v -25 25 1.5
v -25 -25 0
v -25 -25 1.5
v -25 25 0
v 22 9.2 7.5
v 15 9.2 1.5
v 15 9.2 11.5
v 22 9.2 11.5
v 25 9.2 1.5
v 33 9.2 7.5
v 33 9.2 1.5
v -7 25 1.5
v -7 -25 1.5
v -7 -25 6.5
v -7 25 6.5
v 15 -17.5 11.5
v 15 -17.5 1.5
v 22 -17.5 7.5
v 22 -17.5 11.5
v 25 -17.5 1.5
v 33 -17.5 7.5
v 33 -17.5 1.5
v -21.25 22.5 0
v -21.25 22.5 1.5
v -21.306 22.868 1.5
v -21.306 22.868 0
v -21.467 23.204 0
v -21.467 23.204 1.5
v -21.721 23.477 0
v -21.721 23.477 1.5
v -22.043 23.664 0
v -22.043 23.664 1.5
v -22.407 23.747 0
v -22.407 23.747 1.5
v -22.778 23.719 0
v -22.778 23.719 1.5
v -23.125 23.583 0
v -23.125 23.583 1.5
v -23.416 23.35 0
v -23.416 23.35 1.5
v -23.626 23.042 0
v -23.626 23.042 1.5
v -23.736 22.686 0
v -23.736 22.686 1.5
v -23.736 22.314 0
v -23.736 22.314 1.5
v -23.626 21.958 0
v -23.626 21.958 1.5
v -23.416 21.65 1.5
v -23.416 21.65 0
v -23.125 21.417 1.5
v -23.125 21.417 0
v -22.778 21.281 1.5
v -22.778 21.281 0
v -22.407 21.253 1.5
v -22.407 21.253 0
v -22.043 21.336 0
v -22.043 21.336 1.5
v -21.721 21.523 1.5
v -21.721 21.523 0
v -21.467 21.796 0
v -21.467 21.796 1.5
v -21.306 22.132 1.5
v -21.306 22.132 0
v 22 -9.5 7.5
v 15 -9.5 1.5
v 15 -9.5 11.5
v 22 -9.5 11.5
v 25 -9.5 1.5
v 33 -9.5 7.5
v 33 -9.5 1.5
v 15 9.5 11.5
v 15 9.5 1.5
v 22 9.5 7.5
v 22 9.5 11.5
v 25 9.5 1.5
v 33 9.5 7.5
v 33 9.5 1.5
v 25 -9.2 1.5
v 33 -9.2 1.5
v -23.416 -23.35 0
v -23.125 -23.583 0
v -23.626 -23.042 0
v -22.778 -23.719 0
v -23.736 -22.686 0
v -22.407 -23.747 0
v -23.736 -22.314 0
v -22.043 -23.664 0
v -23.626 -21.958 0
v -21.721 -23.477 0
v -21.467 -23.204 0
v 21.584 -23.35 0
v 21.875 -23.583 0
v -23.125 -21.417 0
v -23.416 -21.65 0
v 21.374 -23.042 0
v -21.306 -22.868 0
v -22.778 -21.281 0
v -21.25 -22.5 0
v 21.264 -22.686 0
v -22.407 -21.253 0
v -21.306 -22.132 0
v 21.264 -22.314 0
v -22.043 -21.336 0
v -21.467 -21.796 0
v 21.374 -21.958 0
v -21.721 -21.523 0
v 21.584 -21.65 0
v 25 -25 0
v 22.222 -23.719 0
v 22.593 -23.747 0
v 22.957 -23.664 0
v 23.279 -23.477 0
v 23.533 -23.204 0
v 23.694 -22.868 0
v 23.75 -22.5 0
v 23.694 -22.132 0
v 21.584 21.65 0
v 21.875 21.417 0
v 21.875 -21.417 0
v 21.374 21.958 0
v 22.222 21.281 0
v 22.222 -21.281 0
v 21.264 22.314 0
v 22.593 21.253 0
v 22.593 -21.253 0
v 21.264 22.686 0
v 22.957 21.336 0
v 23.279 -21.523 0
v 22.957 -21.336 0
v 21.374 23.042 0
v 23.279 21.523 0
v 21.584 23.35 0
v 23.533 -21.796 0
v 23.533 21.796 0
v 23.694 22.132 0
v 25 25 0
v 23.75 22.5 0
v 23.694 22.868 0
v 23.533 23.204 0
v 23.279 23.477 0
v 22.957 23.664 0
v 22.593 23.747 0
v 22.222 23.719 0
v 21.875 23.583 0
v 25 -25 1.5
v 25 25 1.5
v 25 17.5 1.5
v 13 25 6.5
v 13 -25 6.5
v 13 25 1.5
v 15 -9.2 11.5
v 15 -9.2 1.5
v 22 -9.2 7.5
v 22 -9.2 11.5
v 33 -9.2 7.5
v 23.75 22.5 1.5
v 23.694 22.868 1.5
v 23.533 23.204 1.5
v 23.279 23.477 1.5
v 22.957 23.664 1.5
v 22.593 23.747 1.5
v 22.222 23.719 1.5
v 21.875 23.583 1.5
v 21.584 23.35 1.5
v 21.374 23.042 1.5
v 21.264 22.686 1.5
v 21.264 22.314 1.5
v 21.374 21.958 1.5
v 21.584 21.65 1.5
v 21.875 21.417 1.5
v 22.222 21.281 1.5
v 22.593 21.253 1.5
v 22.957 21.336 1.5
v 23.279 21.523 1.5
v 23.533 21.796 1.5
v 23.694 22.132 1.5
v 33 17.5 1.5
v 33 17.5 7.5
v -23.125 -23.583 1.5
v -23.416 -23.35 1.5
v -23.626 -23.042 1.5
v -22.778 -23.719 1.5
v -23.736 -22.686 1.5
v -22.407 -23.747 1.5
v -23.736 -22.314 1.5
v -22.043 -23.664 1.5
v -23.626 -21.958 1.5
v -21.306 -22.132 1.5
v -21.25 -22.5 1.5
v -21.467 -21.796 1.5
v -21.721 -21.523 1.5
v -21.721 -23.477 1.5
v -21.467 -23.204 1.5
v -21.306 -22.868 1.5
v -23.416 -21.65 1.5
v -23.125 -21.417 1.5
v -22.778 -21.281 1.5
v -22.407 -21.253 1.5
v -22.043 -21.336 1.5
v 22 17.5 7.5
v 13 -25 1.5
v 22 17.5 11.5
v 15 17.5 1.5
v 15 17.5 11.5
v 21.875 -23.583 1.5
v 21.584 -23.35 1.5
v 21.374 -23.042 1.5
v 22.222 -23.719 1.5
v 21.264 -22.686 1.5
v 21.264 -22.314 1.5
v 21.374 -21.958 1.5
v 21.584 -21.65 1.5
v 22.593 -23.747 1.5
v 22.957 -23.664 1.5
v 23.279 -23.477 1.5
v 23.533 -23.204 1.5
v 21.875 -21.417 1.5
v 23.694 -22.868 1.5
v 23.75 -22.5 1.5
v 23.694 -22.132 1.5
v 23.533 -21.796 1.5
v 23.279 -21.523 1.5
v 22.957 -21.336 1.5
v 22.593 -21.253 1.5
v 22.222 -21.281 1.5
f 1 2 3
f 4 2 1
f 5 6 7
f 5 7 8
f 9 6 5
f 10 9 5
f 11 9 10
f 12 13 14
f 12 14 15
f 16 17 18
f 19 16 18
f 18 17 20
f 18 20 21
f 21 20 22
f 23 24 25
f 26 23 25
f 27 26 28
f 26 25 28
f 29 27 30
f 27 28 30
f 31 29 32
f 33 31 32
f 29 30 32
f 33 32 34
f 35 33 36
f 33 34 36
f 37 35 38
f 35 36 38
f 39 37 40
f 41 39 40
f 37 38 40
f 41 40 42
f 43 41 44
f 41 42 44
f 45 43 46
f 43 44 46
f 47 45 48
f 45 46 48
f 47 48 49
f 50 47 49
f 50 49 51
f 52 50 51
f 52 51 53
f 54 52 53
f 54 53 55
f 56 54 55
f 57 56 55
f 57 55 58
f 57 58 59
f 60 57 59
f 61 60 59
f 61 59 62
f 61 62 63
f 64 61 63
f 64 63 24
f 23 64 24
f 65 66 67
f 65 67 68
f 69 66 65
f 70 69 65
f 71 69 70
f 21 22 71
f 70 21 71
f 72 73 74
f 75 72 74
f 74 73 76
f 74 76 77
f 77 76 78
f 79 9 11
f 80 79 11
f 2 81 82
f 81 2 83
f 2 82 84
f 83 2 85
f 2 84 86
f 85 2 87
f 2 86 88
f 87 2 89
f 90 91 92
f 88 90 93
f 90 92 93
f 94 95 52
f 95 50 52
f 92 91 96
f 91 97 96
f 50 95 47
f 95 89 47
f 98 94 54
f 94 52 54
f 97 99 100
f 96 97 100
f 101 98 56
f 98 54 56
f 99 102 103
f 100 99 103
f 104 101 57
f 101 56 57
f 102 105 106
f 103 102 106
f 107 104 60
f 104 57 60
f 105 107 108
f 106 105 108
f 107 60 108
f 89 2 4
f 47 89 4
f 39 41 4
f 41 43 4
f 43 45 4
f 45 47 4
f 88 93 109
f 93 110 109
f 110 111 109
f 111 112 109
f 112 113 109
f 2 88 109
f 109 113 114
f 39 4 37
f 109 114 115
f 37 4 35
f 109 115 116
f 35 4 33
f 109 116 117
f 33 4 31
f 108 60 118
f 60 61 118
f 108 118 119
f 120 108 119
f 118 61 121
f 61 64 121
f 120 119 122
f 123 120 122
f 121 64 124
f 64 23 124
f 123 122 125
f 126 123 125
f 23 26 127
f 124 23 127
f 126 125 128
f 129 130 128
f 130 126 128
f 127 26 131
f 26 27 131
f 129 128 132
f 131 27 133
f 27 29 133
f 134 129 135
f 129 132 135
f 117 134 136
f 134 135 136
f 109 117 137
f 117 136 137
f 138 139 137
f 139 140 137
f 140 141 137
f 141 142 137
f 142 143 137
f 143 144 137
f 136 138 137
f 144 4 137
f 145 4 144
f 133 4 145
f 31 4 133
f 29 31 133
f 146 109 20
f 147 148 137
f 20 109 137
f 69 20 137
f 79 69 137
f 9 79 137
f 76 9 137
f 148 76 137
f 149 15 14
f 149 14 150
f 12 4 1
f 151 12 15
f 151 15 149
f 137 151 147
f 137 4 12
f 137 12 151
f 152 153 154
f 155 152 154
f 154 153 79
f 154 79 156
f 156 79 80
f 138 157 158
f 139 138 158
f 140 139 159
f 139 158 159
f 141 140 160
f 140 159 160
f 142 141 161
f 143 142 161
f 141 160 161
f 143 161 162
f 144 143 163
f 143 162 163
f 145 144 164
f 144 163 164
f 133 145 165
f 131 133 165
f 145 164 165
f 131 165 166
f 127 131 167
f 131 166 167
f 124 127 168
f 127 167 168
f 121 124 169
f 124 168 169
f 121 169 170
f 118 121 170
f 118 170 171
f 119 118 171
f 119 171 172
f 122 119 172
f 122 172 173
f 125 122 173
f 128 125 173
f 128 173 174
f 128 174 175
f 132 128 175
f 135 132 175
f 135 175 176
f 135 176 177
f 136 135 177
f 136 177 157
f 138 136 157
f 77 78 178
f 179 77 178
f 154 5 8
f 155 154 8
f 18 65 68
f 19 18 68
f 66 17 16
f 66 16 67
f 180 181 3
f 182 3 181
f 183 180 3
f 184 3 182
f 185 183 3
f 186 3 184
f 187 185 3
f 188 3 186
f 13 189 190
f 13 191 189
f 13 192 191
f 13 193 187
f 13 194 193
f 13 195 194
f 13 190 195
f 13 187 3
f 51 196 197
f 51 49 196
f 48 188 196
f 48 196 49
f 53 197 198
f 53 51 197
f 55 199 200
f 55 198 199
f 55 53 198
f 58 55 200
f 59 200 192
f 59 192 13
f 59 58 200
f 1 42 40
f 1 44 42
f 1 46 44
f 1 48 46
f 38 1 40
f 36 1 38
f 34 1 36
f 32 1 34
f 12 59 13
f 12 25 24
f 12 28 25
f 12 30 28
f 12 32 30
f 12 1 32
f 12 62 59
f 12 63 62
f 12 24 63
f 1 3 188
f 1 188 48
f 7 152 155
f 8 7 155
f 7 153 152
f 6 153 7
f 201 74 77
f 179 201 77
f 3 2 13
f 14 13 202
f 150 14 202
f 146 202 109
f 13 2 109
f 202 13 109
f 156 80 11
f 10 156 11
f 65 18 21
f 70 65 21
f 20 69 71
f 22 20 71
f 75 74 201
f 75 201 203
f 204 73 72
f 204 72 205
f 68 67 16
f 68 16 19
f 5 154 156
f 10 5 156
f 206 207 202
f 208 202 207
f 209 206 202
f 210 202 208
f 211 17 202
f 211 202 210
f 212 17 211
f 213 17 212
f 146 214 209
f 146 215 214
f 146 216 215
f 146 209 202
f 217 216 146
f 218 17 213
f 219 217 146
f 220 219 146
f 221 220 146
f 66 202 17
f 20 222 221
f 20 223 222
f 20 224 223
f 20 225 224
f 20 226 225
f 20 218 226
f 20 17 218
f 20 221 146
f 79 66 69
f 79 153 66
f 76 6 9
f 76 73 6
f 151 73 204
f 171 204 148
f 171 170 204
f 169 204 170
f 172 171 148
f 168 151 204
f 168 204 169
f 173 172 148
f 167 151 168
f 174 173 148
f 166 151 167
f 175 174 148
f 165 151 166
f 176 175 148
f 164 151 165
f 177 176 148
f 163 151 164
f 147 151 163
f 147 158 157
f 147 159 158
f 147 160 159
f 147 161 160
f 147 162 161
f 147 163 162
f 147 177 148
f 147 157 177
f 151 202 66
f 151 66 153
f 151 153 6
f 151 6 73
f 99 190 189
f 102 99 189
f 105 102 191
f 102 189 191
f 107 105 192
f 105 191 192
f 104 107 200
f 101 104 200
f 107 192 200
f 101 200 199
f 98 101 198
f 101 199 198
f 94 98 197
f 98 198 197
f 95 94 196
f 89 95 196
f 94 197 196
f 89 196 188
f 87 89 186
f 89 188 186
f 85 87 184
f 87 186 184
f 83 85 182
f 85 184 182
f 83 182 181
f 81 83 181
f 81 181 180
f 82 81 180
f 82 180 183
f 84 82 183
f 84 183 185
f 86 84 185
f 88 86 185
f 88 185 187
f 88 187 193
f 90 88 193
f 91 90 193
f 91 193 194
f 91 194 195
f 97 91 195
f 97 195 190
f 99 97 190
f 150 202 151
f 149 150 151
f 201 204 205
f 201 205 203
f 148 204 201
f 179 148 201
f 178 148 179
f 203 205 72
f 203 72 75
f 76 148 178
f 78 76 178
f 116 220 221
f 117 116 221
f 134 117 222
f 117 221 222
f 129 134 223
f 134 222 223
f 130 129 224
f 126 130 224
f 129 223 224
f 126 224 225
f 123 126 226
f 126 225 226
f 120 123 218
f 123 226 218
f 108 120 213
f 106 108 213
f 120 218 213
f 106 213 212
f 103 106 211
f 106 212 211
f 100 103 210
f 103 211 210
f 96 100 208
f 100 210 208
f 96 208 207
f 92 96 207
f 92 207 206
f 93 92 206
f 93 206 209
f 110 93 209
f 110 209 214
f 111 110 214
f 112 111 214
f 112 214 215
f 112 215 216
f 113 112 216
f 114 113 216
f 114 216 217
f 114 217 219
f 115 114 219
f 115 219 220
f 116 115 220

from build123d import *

# Parameters (mm, degrees)
SKETCH_1_W          = 50
SKETCH_1_H          = 50
EXTRUDE_1_DEPTH     = 1.5
SKETCH_2_W          = 20
SKETCH_2_H          = 50
EXTRUDE_2_DEPTH     = 5
SKETCH_3_W          = 18
SKETCH_3_H          = 8
SKETCH_3_H_2        = 18.4
EXTRUDE_3_DEPTH     = 10
SKETCH_4_W          = 11
SKETCH_4_H          = 4
CUT_EXTRUDE_1_DEPTH = 56.022722579
SKETCH_5_R          = 1.25
CUT_EXTRUDE_2_DEPTH = 43.591078878


with BuildPart() as part:
    # 草图1 → 凸台-拉伸1 (new body)
    with BuildSketch(Plane.XY):
        Rectangle(SKETCH_1_W, SKETCH_1_H)
    extrude(amount=EXTRUDE_1_DEPTH)

    # 草图2 → 凸台-拉伸2 (add)
    with BuildSketch(Plane.XY.offset(1.5)):
        with Locations((3, 0)):
            Rectangle(SKETCH_2_W, SKETCH_2_H)
    extrude(amount=EXTRUDE_2_DEPTH)

    # 草图3 → 凸台-拉伸3 (add)
    with BuildSketch(Plane.XY.offset(1.5)):
        with Locations((24, 13.5)):
            Rectangle(SKETCH_3_W, SKETCH_3_H)
        with Locations((24, 0)):
            Rectangle(SKETCH_3_W, SKETCH_3_H_2)
        with Locations((24, -13.5)):
            Rectangle(SKETCH_3_W, SKETCH_3_H)
    extrude(amount=EXTRUDE_3_DEPTH)

    # 草图4 → 切除-拉伸1 (cut, through all)
    with BuildSketch(Plane.XZ.offset(17.5)):
        with Locations((27.5, 9.5)):
            Rectangle(SKETCH_4_W, SKETCH_4_H)
    extrude(amount=-CUT_EXTRUDE_1_DEPTH, mode=Mode.SUBTRACT)

    # 草图5 → 切除-拉伸2 (cut, through all)
    with BuildSketch(Plane.XY.offset(1.5)):
        with Locations((-22.5, 22.5)):
            Circle(SKETCH_5_R)
        with Locations((22.5, 22.5)):
            Circle(SKETCH_5_R)
        with Locations((22.5, -22.5)):
            Circle(SKETCH_5_R)
        with Locations((-22.5, -22.5)):
            Circle(SKETCH_5_R)
    extrude(amount=-CUT_EXTRUDE_2_DEPTH, mode=Mode.SUBTRACT)


solid = part.part
